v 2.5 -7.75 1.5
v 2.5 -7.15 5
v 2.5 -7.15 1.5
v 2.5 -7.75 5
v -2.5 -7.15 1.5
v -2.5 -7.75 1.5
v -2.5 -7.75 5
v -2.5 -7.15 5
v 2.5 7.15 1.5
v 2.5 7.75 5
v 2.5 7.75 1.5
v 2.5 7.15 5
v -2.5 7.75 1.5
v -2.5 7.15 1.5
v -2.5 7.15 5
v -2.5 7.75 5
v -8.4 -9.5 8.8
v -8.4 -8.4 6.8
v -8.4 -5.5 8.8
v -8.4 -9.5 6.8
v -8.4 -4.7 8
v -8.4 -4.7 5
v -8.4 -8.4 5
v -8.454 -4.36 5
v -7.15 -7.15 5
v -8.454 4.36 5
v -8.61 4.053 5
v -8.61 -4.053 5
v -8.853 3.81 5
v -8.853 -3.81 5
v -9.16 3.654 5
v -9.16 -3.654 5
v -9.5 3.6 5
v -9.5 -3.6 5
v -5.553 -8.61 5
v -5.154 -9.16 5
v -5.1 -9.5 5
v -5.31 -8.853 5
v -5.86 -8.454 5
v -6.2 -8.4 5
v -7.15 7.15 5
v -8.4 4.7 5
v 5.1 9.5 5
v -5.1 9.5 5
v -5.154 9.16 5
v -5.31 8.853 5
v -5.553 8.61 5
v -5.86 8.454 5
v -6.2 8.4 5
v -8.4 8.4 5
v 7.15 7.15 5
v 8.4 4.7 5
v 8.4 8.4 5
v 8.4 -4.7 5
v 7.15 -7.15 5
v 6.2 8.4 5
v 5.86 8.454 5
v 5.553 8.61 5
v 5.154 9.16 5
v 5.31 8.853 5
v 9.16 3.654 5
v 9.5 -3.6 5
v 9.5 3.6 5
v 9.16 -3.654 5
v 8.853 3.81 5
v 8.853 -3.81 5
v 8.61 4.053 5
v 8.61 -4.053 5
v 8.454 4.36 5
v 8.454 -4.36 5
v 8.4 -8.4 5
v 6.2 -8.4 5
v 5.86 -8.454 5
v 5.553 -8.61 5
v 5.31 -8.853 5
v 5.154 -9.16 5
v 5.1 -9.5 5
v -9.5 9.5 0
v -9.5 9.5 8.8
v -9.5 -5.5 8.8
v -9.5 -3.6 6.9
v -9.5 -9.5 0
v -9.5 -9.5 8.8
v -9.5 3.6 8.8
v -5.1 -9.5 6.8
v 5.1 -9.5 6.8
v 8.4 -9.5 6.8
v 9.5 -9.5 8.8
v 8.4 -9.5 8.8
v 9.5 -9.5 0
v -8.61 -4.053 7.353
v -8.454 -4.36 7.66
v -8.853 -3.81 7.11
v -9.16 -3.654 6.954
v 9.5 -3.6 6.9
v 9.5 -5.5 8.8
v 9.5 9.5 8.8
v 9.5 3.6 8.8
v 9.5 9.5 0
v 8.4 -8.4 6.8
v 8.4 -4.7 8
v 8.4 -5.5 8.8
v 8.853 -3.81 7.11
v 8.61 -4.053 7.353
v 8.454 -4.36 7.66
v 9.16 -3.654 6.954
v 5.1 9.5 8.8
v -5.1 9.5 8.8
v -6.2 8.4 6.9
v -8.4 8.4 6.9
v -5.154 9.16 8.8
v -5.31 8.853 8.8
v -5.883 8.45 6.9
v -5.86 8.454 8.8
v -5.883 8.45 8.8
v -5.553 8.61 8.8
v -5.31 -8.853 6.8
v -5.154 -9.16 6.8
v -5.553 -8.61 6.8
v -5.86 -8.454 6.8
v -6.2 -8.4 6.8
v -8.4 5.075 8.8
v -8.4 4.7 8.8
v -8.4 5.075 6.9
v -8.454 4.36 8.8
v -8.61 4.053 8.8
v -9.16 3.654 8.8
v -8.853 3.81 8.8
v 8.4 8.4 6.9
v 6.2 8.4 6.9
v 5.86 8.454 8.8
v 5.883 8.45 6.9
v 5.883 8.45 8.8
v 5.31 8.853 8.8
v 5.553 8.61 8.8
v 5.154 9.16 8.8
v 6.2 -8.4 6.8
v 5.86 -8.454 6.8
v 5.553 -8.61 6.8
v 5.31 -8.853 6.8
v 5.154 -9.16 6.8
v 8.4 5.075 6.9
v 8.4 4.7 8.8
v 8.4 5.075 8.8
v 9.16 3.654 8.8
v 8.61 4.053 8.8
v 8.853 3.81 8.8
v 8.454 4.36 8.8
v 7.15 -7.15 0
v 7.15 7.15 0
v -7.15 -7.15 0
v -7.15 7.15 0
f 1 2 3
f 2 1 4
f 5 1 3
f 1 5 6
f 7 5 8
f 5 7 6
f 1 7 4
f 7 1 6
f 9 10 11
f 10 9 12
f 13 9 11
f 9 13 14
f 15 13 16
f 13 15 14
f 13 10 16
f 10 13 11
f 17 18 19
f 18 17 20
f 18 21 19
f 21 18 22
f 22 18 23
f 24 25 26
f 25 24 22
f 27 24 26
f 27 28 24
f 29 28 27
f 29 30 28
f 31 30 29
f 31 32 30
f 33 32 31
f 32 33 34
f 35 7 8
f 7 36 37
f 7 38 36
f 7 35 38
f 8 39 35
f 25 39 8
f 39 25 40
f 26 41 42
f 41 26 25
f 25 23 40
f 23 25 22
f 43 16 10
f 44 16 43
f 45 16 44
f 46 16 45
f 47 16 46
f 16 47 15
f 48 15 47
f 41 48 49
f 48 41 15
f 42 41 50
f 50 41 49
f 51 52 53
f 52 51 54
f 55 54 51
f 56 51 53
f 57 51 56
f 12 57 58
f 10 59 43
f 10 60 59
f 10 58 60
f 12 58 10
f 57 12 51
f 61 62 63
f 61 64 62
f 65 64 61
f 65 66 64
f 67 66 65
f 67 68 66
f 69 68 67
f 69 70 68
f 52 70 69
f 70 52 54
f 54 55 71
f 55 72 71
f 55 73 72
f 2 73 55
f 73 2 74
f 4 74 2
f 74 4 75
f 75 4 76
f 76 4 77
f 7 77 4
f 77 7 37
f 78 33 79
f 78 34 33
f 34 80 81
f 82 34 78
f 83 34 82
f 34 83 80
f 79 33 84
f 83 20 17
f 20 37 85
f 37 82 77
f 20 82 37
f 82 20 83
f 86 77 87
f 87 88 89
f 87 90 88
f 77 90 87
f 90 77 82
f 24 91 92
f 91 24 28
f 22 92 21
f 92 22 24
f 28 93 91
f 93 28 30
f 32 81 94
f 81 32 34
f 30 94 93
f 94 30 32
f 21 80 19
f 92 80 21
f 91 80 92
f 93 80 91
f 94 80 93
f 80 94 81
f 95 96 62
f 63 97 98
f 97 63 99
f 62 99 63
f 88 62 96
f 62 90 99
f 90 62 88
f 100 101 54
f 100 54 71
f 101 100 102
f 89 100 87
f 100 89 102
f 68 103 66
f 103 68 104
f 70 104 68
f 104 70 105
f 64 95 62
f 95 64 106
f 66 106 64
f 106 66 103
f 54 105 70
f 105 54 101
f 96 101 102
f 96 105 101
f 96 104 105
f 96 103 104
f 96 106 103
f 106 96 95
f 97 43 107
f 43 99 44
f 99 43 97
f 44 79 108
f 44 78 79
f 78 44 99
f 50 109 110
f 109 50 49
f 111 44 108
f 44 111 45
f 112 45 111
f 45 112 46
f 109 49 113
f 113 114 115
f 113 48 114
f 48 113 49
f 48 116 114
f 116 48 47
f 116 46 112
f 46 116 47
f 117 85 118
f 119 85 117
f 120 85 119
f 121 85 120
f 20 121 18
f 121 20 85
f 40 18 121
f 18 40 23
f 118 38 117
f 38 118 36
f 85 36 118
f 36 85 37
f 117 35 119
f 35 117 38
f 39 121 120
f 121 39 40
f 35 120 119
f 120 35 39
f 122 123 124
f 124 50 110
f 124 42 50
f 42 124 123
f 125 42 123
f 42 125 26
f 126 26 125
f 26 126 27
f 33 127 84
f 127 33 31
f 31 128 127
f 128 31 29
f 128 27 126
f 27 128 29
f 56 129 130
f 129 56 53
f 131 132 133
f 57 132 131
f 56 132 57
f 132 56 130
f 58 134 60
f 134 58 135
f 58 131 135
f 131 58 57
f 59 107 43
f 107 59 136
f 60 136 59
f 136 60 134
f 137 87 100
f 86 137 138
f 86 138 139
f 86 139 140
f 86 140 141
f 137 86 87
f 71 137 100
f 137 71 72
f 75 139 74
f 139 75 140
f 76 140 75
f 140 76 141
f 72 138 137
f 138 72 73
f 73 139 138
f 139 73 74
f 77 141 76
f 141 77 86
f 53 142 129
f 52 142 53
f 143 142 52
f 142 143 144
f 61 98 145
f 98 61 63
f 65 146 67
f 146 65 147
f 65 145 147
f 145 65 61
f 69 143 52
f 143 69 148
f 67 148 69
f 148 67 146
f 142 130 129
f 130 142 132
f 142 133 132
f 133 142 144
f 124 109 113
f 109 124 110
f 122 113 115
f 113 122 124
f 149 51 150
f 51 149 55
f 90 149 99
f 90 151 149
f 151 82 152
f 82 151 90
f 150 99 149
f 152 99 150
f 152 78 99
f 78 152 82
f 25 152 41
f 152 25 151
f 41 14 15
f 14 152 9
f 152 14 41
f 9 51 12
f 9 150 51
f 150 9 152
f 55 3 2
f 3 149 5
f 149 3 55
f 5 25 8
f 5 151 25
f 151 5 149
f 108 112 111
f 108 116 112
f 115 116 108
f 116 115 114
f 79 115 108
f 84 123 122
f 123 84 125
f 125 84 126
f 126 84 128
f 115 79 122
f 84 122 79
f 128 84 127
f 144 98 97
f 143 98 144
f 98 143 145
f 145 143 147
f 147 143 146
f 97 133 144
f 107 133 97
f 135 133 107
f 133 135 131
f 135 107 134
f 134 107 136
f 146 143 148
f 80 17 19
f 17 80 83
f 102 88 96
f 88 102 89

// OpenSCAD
$fn=20;
difference() {
    translate([0,0,(pcb_h+component_h+cherry_board_to_board)/2])
    cube([pcb_outer_l,pcb_outer_l,(pcb_h+component_h+cherry_board_to_board)], true);
    key_hole();
}

/***** Printing Play ************************************************************/
// Adjust this based on your desired tolerances
h_play=0.2; // Horizontal Play
v_play=0.3; // Vertical Play


/***** Cherry *******************************************************************/
 // Distance betwenn top of PCB and top of mounting plate
cherry_board_to_board=5; // ~ 0.2*25.4;
// Metal Frame Thickness
cherry_metal_frame=1.5; // ~ 0.06*25.4;

// Key Top
cherry_key_top_side=17;

// Cut out
cherry_key_side=14; // ~ 0.551*25.4;
// Length of slot for key clipping mechansim
cherry_clip_l=5;
cherry_clip_d=(cherry_key_top_side-cherry_key_side)/2;

/***** PCB **********************************************************************/
pcb_outer_l=19;
pcb_inner_l=16.5 + v_play;
pcb_h=1.6+h_play;
pcb_x_tab_l=11.5 + v_play;
pcb_y_tab_l=8.5 + v_play;
pcb_tab_d=(pcb_outer_l - pcb_inner_l)/2;
pcb_x_tab_l2=pcb_x_tab_l/2-pcb_tab_d;
pcb_y_tab_l2=pcb_y_tab_l/2-pcb_tab_d;

/***** Componenst ***************************************************************/
component_h=2;

module key_hole() {
    // Main Key body and mounting plate cutout
    translate([0,0,(cherry_board_to_board+pcb_h)/2])
    cube([cherry_key_side + v_play, cherry_key_side + v_play, cherry_board_to_board+pcb_h], true);

    // Slots for Key side clips, needed to clip 
    cherry_clip_offset_z=(cherry_board_to_board+cherry_metal_frame)/2;
    cherry_clip_offset_y=cherry_key_side/2;
    for (i=[-1,1]) {
        translate([0,i*cherry_clip_offset_y,cherry_clip_offset_z+pcb_h/2])
        cube([cherry_clip_l, cherry_clip_d, cherry_board_to_board-cherry_metal_frame+pcb_h], true);
    }

    pcb_tab_offset=(pcb_outer_l-pcb_tab_d)/2;
    pcb_tab_offset_x=(pcb_outer_l-pcb_x_tab_l2)/2;
    pcb_tab_offset_y=(pcb_outer_l-pcb_y_tab_l2)/2;
    pcb_tab_offset_fillet=pcb_outer_l/2;
    pcb_tab_offset_fillet_x=pcb_tab_offset_x - pcb_x_tab_l2/2;
    pcb_tab_offset_fillet_y=pcb_tab_offset_y - pcb_y_tab_l2/2;
    pcb_n_comp_h=pcb_h+component_h;
    translate([0,0,pcb_n_comp_h/2 + cherry_board_to_board])
    // Centor part
    difference() {
        cube([pcb_outer_l,pcb_outer_l,pcb_n_comp_h],true);
        union() {
            for (i=[-1,1]) {
                // Y Tab Corners Top
                translate([i*pcb_tab_offset_y, pcb_tab_offset, 0])
                cube([pcb_y_tab_l2, pcb_tab_d, pcb_n_comp_h], true);
                translate([i*pcb_tab_offset_fillet_y, pcb_tab_offset_fillet,-pcb_n_comp_h/2])
                cylinder(pcb_n_comp_h, pcb_tab_d, pcb_tab_d);
                // Y Tab Corners Bottom
                translate([i*pcb_tab_offset_y, -pcb_tab_offset, -component_h/2])
                cube([pcb_y_tab_l2, pcb_tab_d, pcb_h], true);
                translate([i*pcb_tab_offset_fillet_y, -pcb_tab_offset_fillet,-(pcb_n_comp_h/2)])
                cylinder(pcb_h, pcb_tab_d, pcb_tab_d);


                // X Tab Corners
                translate([i*pcb_tab_offset, pcb_tab_offset_x, 0])
                cube([pcb_tab_d, pcb_x_tab_l2, pcb_n_comp_h], true);
                translate([i*pcb_tab_offset_fillet, pcb_tab_offset_fillet_x,-pcb_n_comp_h/2])
                cylinder(pcb_n_comp_h, pcb_tab_d, pcb_tab_d);

                // X Tab Corners Cut
                difference() {
                    union() {
                        translate([i*pcb_tab_offset, -pcb_tab_offset_x, 0])
                        cube([pcb_tab_d, pcb_x_tab_l2, pcb_n_comp_h], true);
                        translate([i*pcb_tab_offset_fillet, -pcb_tab_offset_fillet_x,-pcb_n_comp_h/2])
                        cylinder(pcb_n_comp_h, pcb_tab_d, pcb_tab_d);
                    }
                    translate([pcb_outer_l/2,-(pcb_tab_offset_fillet_x-pcb_tab_d),component_h])
                    rotate([180,90,0])
                    extruded_triangle(component_h, component_h, pcb_outer_l);
                }

              }
            translate([pcb_outer_l/2, pcb_outer_l/2, 0])
            rotate([0,0,180])
            extruded_triangle(pcb_y_tab_l2+pcb_tab_d,pcb_x_tab_l2+pcb_tab_d,component_h);

            translate([-pcb_outer_l/2, pcb_outer_l/2, component_h])
            rotate([0,180,180])
            extruded_triangle(pcb_y_tab_l2+pcb_tab_d,pcb_x_tab_l2+pcb_tab_d,component_h);
        }
    }
}


module extruded_triangle( w,l,h ) {
    polyhedron([
        [0,0,0],
        [w,0,0],
        [0,l,0],
        [0,0,h],
        [w,0,h],
        [0,l,h]       
    ],[
        [0,1,2],
        [0,3,4,1],
        [0,2,5,3],
        [1,4,5,2],
        [3,5,4]
    ]);
}
